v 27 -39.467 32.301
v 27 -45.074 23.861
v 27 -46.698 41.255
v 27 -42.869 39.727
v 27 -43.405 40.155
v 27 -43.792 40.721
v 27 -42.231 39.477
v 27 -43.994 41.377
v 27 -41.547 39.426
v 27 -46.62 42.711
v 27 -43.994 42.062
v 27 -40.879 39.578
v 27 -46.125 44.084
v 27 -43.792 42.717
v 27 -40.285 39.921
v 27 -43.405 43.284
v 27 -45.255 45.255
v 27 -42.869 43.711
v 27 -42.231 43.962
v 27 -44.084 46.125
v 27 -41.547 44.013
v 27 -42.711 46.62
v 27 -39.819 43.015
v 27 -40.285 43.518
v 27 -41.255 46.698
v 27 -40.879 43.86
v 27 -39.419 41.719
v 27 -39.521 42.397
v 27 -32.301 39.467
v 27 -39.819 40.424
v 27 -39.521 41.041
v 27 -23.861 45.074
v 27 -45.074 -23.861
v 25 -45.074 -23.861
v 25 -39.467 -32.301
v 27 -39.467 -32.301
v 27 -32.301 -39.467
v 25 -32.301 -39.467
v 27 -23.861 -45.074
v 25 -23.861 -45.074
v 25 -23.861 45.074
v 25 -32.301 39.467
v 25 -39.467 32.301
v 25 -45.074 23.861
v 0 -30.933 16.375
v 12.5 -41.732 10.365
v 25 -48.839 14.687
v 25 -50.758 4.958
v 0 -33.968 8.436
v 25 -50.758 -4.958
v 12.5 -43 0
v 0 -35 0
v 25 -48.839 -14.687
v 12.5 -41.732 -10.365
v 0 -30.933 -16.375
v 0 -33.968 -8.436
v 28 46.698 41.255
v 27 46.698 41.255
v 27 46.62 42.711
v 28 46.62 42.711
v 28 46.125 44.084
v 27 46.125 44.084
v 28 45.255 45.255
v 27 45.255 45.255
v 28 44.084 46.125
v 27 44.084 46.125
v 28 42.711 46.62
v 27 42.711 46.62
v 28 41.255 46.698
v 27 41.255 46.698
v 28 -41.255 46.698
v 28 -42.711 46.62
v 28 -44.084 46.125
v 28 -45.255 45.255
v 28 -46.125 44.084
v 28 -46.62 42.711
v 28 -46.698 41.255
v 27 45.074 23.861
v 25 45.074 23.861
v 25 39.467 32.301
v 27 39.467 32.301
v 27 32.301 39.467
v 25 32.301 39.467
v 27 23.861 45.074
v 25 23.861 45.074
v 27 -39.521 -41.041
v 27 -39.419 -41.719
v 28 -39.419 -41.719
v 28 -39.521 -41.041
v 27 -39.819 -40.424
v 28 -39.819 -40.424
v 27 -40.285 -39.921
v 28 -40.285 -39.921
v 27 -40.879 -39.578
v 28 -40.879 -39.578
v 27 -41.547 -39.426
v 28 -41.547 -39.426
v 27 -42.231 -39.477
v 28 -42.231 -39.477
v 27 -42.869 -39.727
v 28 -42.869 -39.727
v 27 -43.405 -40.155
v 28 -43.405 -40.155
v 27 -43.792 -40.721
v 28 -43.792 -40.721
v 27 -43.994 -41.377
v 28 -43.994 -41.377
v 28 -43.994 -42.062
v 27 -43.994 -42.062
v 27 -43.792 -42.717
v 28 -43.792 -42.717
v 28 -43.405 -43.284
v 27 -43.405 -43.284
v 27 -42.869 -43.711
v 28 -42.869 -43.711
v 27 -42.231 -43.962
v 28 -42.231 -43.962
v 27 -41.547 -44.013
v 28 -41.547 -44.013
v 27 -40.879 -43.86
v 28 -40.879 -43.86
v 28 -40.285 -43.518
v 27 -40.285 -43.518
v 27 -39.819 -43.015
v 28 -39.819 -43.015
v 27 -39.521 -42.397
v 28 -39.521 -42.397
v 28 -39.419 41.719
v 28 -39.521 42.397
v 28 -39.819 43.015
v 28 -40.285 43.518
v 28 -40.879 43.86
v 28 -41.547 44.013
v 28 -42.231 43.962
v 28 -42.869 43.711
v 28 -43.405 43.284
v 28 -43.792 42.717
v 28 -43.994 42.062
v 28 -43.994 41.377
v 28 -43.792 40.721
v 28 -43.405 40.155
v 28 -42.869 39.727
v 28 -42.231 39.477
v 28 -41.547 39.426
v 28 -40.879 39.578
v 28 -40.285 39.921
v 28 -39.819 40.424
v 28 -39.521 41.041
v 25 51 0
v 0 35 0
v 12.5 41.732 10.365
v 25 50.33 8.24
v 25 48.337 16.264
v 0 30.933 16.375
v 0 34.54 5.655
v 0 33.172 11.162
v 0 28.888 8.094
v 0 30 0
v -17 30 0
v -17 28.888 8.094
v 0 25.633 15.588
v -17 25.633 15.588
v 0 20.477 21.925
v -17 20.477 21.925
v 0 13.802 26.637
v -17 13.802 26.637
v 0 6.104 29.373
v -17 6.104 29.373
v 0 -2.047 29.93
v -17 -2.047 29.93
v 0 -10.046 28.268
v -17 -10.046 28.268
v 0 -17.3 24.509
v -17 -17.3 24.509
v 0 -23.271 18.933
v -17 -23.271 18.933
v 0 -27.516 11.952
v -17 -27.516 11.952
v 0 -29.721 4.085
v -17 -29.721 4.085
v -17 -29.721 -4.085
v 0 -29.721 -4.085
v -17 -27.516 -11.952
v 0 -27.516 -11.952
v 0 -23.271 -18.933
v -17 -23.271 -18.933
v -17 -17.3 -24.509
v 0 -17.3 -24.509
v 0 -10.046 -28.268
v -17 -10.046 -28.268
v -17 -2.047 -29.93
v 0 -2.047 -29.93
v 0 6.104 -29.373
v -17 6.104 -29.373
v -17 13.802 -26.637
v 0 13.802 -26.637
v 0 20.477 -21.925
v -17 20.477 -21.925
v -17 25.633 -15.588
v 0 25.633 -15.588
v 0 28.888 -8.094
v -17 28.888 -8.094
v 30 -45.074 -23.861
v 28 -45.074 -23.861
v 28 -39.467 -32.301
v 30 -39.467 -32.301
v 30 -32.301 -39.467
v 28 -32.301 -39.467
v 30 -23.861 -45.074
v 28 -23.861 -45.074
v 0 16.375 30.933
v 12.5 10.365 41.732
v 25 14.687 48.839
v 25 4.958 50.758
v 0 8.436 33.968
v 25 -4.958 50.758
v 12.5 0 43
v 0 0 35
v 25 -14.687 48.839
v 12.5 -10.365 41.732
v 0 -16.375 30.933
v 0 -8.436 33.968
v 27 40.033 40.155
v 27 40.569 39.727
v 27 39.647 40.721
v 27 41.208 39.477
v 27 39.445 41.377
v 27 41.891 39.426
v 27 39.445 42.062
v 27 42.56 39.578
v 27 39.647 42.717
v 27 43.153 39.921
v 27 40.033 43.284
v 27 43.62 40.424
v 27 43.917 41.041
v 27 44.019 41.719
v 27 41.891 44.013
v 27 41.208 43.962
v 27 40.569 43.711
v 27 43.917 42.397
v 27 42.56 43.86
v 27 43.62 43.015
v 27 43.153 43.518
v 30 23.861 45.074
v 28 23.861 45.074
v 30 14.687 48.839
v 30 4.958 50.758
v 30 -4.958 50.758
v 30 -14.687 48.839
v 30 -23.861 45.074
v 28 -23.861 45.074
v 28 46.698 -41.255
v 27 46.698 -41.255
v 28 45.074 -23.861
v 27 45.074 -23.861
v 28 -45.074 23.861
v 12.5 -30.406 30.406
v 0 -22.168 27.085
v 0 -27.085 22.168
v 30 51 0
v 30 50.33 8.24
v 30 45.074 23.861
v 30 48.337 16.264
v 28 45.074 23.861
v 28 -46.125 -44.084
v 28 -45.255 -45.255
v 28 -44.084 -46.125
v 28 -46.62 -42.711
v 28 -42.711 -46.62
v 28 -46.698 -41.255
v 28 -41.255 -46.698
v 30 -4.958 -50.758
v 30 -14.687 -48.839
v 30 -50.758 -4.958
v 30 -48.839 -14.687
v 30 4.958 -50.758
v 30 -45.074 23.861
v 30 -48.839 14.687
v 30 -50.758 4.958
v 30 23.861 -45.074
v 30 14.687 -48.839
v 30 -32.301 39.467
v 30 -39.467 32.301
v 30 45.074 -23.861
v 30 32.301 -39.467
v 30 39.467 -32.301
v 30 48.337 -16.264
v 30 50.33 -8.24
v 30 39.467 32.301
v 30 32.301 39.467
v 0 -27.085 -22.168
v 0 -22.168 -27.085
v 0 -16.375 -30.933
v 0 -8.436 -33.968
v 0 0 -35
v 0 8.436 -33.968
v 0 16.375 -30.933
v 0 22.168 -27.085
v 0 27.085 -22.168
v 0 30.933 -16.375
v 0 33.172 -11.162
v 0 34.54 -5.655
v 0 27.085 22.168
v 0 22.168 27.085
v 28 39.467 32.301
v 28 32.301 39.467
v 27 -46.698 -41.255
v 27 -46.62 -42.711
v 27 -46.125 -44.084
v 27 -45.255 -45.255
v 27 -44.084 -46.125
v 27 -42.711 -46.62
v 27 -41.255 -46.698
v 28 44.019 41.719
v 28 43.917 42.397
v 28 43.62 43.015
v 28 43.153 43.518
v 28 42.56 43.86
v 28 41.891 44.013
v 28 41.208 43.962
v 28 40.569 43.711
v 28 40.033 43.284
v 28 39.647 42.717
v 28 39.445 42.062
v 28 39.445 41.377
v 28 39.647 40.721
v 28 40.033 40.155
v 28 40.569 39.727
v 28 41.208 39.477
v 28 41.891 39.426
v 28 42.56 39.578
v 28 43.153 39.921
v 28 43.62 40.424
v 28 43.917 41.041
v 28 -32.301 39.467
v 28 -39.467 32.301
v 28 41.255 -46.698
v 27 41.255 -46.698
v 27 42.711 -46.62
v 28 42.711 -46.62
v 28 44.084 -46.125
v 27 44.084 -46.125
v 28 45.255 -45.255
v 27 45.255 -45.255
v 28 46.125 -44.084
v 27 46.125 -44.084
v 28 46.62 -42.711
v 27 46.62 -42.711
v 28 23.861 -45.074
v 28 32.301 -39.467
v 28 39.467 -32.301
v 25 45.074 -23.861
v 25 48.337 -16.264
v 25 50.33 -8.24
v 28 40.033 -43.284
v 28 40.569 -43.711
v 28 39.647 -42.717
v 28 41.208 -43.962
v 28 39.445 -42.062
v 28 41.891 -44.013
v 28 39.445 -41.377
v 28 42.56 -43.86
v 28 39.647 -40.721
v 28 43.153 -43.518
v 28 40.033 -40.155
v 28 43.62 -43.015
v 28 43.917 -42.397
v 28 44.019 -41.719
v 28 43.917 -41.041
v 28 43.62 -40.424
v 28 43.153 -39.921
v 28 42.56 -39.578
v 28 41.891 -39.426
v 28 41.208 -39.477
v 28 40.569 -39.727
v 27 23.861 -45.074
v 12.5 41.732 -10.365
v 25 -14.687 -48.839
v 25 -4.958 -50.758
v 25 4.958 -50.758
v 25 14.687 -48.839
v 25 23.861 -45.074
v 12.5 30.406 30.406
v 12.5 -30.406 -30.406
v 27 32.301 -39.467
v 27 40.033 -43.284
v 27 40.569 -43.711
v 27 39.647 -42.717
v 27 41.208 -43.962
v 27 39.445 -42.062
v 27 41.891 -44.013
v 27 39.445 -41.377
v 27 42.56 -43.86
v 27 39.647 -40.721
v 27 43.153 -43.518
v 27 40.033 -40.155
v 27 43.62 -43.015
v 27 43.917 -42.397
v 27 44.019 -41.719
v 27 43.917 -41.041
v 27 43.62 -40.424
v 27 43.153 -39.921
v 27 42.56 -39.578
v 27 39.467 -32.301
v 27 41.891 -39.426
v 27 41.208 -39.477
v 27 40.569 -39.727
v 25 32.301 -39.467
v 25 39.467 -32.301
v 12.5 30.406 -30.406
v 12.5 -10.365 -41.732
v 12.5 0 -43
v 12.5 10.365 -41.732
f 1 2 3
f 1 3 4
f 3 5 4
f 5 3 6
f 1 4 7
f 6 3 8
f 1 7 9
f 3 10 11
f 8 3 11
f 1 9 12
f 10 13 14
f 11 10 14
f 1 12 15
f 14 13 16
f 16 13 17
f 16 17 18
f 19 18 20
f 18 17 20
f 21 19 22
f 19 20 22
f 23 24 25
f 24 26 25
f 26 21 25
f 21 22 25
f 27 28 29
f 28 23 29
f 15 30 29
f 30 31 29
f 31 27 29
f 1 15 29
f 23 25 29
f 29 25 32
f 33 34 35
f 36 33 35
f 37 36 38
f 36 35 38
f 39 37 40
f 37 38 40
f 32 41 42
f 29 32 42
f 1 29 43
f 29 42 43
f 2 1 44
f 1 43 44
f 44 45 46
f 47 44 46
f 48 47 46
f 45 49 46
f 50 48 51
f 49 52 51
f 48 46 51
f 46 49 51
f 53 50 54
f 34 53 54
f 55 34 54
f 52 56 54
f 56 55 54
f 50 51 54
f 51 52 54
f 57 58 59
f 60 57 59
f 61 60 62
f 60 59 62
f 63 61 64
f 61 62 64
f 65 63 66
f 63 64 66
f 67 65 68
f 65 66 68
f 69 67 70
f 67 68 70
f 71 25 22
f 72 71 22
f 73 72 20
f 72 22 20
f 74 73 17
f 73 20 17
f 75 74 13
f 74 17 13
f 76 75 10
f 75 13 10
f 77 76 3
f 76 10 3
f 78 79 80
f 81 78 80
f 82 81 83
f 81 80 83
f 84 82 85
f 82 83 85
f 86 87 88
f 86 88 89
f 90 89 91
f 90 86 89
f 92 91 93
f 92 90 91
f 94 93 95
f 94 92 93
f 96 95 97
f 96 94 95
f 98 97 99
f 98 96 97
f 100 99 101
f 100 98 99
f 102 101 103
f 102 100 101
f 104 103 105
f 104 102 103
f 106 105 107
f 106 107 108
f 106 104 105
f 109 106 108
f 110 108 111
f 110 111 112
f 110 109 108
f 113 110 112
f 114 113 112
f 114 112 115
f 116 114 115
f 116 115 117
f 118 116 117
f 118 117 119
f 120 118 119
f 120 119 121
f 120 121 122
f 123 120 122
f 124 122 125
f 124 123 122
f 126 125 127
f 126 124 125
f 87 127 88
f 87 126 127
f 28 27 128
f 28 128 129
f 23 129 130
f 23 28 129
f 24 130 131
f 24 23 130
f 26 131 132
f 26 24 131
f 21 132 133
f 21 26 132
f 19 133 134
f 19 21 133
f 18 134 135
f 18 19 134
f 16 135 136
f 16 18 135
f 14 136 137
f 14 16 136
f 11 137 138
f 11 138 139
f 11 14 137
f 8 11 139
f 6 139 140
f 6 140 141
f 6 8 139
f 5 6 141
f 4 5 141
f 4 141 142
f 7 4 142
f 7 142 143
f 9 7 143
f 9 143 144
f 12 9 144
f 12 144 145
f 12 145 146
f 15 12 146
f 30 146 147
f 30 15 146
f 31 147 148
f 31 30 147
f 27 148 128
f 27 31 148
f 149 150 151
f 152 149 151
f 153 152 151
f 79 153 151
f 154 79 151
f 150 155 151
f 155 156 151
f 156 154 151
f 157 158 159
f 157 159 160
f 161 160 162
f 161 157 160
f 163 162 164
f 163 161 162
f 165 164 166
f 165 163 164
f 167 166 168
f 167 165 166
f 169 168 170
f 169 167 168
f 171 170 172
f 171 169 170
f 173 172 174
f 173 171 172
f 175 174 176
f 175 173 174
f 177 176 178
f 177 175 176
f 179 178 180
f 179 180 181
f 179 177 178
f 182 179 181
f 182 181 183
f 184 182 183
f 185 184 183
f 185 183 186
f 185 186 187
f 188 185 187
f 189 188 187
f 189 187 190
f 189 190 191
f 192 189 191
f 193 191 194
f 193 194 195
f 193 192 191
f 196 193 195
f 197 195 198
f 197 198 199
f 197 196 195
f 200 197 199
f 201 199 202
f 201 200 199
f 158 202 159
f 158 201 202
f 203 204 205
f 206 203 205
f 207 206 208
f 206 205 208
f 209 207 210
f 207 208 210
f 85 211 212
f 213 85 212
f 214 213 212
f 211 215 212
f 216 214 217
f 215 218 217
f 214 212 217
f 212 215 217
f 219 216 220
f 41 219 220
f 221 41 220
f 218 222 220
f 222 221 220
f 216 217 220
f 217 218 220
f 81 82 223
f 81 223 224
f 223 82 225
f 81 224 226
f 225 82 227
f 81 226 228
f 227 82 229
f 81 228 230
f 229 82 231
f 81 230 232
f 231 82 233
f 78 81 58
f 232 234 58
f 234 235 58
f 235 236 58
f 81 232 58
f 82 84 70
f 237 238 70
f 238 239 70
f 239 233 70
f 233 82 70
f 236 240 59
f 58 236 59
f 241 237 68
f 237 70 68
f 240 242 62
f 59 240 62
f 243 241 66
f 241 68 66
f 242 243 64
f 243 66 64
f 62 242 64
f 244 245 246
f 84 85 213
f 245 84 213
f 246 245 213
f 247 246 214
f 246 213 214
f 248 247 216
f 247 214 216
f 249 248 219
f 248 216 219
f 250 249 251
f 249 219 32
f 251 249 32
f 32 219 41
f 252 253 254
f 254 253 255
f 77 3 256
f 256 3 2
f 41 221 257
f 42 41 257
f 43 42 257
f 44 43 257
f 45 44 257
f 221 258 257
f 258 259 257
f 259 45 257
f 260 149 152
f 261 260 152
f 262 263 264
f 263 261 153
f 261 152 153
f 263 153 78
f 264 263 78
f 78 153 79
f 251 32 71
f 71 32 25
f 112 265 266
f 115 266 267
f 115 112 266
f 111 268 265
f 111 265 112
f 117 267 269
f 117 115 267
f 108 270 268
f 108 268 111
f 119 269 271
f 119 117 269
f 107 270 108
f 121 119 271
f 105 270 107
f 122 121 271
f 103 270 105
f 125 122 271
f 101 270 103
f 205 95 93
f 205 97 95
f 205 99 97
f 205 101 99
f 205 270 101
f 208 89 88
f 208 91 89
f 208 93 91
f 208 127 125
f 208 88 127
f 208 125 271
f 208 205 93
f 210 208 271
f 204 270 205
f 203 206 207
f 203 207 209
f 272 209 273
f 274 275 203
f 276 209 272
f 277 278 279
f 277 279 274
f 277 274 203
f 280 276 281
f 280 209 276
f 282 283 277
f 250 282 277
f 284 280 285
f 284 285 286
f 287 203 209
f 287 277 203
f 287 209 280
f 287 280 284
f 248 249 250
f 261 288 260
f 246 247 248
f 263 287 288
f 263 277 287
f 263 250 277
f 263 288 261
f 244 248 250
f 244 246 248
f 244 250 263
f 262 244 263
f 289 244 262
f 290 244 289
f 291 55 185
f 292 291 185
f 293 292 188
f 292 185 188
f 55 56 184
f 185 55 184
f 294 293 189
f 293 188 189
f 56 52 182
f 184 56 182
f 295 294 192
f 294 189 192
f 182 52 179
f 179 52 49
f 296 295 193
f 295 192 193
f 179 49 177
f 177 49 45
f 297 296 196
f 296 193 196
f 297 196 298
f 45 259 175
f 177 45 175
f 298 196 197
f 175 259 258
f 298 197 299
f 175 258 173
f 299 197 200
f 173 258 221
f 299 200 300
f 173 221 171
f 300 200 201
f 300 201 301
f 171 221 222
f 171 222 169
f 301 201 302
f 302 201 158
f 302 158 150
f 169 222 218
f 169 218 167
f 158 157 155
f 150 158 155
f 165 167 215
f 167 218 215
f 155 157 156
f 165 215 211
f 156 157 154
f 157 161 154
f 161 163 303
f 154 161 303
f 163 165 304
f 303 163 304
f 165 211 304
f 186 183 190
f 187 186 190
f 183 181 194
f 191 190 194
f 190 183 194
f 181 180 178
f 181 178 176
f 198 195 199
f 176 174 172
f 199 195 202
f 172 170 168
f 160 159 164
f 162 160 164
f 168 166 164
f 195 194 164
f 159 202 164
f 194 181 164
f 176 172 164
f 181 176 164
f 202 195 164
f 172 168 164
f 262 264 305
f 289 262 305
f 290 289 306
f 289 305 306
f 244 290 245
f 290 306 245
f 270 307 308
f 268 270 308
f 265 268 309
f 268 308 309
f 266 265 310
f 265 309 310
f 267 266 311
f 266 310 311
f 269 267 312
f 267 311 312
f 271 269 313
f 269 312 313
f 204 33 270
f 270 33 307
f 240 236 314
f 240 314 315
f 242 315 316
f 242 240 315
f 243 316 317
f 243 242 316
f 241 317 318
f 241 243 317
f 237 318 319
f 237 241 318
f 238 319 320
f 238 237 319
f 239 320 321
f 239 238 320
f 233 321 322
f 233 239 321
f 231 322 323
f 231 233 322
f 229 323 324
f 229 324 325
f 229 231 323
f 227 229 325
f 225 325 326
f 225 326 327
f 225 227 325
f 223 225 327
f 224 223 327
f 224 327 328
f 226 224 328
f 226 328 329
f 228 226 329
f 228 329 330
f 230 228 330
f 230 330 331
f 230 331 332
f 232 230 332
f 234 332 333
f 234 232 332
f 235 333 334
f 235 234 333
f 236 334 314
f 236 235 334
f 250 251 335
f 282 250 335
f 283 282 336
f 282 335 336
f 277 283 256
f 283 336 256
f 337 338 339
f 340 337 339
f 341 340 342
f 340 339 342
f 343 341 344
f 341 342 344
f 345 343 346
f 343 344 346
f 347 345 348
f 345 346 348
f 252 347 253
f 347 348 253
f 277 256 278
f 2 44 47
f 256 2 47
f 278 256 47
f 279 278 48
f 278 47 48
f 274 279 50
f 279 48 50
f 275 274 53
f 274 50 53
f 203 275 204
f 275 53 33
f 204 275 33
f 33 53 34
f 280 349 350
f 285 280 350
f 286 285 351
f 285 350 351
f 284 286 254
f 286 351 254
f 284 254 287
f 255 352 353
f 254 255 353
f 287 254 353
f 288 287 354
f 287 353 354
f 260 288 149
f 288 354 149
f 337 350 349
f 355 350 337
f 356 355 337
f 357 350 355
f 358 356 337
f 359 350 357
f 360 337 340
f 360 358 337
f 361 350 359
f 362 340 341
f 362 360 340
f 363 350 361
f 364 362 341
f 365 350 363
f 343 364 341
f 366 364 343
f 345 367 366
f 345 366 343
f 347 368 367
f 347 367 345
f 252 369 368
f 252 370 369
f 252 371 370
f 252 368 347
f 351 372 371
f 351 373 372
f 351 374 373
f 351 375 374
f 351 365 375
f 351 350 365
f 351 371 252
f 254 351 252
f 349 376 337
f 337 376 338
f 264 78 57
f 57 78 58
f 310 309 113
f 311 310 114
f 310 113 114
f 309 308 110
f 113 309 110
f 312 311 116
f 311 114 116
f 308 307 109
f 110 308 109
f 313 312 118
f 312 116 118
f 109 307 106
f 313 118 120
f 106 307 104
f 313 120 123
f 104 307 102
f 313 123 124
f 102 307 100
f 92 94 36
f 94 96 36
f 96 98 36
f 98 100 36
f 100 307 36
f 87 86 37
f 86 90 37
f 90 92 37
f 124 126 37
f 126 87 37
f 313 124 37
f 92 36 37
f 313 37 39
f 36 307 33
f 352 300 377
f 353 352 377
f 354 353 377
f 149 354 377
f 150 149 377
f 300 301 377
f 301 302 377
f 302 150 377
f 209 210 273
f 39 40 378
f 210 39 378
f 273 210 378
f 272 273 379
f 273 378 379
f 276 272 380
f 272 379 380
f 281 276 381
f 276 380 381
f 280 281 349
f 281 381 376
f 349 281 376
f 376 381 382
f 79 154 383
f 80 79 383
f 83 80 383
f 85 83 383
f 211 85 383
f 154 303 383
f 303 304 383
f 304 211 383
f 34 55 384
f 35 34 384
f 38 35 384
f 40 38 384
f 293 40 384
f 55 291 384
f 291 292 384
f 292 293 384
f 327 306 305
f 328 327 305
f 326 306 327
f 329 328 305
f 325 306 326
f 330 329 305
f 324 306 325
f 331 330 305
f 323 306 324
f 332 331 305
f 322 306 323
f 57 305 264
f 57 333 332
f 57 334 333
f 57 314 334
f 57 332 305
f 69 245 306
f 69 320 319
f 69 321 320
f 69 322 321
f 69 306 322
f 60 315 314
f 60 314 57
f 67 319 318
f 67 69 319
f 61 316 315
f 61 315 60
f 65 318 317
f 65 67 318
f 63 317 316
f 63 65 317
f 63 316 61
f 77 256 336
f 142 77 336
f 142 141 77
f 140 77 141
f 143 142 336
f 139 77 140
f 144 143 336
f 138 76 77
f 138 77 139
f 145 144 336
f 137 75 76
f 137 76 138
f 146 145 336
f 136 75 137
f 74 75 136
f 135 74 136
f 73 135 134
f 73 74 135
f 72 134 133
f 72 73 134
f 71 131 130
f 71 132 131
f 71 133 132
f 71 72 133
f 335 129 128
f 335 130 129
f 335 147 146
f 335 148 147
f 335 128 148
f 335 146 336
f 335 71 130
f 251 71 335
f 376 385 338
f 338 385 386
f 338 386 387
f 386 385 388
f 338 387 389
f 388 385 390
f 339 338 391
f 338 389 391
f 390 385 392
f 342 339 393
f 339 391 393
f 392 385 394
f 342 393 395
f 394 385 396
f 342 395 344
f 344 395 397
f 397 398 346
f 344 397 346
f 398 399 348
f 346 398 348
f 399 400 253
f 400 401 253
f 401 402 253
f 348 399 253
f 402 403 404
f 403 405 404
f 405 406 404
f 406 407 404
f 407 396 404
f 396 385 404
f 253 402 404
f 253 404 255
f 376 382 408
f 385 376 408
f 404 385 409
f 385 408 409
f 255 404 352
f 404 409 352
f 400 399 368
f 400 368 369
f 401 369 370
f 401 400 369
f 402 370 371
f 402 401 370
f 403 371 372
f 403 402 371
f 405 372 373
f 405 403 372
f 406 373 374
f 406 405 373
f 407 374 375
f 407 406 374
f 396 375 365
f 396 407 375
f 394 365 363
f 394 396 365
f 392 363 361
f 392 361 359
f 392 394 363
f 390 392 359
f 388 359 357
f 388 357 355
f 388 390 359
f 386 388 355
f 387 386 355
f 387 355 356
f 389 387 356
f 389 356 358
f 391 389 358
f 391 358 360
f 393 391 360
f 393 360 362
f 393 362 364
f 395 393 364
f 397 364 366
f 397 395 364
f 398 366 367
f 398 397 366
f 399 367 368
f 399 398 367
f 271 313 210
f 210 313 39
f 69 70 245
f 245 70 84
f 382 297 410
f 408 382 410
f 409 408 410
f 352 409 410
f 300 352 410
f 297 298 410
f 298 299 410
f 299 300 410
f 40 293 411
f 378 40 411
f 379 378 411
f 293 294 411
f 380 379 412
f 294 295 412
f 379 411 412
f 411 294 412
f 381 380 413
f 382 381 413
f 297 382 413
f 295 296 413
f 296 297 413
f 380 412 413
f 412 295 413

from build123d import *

# Parameters (mm, degrees)
F0_R     = 30
F1_DEPTH = 30
F2_START = 27
F0_R_2   = 2.3
F2_DEPTH = 1
F3_DEPTH = 17
F4_SIZE2 = 16
F4_SIZE  = 25


with BuildPart() as f1:
    # F0 (on Right) → F1 (new body)
    with BuildSketch(Plane.YZ):
        with BuildLine():
            ThreePointArc((45.073977597, -23.8607741614), (49.4963274266, -12.2928260085), (51, 0))
            ThreePointArc((51, 0), (49.4963274266, 12.2928260085), (45.073977597, 23.8607741614))
            ThreePointArc((45.073977597, 23.8607741614), (36.0624458405, 36.0624458405), (23.8607741614, 45.073977597))
            ThreePointArc((23.8607741614, 45.073977597), (0, 51), (-23.8607741614, 45.073977597))
            ThreePointArc((-23.8607741614, 45.073977597), (-36.0624458405, 36.0624458405), (-45.073977597, 23.8607741614))
            ThreePointArc((-45.073977597, 23.8607741614), (-51, 0), (-45.073977597, -23.8607741614))
            ThreePointArc((-45.073977597, -23.8607741614), (-36.0624458405, -36.0624458405), (-23.8607741614, -45.073977597))
            ThreePointArc((-23.8607741614, -45.073977597), (0, -51), (23.8607741614, -45.073977597))
            ThreePointArc((23.8607741614, -45.073977597), (36.0624458405, -36.0624458405), (45.073977597, -23.8607741614))
        make_face()
        Circle(F0_R, mode=Mode.SUBTRACT)
        Circle(F0_R)
    extrude(amount=F1_DEPTH)

    # F0 (on Right) → F2 (join)
    with BuildSketch(Plane.YZ.offset(F2_START)):
        with BuildLine():
            ThreePointArc((23.8607741614, 45.073977597), (36.0624458405, 36.0624458405), (45.073977597, 23.8607741614))
            Line((45.073977597, 23.8607741614), (46.6976567543, 41.2545798264))
            ThreePointArc((46.6976567543, 41.2545798264), (45.2548339959, 45.2548339959), (41.2545798264, 46.6976567543))
            Line((41.2545798264, 46.6976567543), (23.8607741614, 45.073977597))
        make_face()
        with Locations((41.71930009, 41.71930009)):
            Circle(F0_R_2, mode=Mode.SUBTRACT)
        with BuildLine():
            ThreePointArc((-45.073977597, 23.8607741614), (-36.0624458405, 36.0624458405), (-23.8607741614, 45.073977597))
            Line((-23.8607741614, 45.073977597), (-41.2545798264, 46.6976567543))
            ThreePointArc((-41.2545798264, 46.6976567543), (-45.2548339959, 45.2548339959), (-46.6976567543, 41.2545798264))
            Line((-46.6976567543, 41.2545798264), (-45.073977597, 23.8607741614))
        make_face()
        with Locations((-41.71930009, 41.71930009)):
            Circle(F0_R_2, mode=Mode.SUBTRACT)
        with BuildLine():
            Line((-41.2545798264, -46.6976567543), (-23.8607741614, -45.073977597))
            ThreePointArc((-23.8607741614, -45.073977597), (-36.0624458405, -36.0624458405), (-45.073977597, -23.8607741614))
            Line((-45.073977597, -23.8607741614), (-46.6976567543, -41.2545798264))
            ThreePointArc((-46.6976567543, -41.2545798264), (-45.2548339959, -45.2548339959), (-41.2545798264, -46.6976567543))
        make_face()
        with Locations((-41.71930009, -41.71930009)):
            Circle(F0_R_2, mode=Mode.SUBTRACT)
        with BuildLine():
            Line((46.6976567543, -41.2545798264), (45.073977597, -23.8607741614))
            ThreePointArc((45.073977597, -23.8607741614), (36.0624458405, -36.0624458405), (23.8607741614, -45.073977597))
            Line((23.8607741614, -45.073977597), (41.2545798264, -46.6976567543))
            ThreePointArc((41.2545798264, -46.6976567543), (45.2548339959, -45.2548339959), (46.6976567543, -41.2545798264))
        make_face()
        with Locations((41.71930009, -41.71930009)):
            Circle(F0_R_2, mode=Mode.SUBTRACT)
    extrude(amount=F2_DEPTH)

    # F0 (on Right) → F3 (join)
    with BuildSketch(Plane.YZ):
        Circle(F0_R)
    extrude(amount=-F3_DEPTH)

    # F4
    f4_edges = [f1.edges().sort_by_distance(p)[0] for p in [
        (0, -45.073978, 23.860774),
    ]]
    f4_side = f1.faces().sort_by_distance((15, -45.073978, 23.860774))[0]
    chamfer(f4_edges, length=F4_SIZE, length2=F4_SIZE2, reference=f4_side)


solid = f1.part
